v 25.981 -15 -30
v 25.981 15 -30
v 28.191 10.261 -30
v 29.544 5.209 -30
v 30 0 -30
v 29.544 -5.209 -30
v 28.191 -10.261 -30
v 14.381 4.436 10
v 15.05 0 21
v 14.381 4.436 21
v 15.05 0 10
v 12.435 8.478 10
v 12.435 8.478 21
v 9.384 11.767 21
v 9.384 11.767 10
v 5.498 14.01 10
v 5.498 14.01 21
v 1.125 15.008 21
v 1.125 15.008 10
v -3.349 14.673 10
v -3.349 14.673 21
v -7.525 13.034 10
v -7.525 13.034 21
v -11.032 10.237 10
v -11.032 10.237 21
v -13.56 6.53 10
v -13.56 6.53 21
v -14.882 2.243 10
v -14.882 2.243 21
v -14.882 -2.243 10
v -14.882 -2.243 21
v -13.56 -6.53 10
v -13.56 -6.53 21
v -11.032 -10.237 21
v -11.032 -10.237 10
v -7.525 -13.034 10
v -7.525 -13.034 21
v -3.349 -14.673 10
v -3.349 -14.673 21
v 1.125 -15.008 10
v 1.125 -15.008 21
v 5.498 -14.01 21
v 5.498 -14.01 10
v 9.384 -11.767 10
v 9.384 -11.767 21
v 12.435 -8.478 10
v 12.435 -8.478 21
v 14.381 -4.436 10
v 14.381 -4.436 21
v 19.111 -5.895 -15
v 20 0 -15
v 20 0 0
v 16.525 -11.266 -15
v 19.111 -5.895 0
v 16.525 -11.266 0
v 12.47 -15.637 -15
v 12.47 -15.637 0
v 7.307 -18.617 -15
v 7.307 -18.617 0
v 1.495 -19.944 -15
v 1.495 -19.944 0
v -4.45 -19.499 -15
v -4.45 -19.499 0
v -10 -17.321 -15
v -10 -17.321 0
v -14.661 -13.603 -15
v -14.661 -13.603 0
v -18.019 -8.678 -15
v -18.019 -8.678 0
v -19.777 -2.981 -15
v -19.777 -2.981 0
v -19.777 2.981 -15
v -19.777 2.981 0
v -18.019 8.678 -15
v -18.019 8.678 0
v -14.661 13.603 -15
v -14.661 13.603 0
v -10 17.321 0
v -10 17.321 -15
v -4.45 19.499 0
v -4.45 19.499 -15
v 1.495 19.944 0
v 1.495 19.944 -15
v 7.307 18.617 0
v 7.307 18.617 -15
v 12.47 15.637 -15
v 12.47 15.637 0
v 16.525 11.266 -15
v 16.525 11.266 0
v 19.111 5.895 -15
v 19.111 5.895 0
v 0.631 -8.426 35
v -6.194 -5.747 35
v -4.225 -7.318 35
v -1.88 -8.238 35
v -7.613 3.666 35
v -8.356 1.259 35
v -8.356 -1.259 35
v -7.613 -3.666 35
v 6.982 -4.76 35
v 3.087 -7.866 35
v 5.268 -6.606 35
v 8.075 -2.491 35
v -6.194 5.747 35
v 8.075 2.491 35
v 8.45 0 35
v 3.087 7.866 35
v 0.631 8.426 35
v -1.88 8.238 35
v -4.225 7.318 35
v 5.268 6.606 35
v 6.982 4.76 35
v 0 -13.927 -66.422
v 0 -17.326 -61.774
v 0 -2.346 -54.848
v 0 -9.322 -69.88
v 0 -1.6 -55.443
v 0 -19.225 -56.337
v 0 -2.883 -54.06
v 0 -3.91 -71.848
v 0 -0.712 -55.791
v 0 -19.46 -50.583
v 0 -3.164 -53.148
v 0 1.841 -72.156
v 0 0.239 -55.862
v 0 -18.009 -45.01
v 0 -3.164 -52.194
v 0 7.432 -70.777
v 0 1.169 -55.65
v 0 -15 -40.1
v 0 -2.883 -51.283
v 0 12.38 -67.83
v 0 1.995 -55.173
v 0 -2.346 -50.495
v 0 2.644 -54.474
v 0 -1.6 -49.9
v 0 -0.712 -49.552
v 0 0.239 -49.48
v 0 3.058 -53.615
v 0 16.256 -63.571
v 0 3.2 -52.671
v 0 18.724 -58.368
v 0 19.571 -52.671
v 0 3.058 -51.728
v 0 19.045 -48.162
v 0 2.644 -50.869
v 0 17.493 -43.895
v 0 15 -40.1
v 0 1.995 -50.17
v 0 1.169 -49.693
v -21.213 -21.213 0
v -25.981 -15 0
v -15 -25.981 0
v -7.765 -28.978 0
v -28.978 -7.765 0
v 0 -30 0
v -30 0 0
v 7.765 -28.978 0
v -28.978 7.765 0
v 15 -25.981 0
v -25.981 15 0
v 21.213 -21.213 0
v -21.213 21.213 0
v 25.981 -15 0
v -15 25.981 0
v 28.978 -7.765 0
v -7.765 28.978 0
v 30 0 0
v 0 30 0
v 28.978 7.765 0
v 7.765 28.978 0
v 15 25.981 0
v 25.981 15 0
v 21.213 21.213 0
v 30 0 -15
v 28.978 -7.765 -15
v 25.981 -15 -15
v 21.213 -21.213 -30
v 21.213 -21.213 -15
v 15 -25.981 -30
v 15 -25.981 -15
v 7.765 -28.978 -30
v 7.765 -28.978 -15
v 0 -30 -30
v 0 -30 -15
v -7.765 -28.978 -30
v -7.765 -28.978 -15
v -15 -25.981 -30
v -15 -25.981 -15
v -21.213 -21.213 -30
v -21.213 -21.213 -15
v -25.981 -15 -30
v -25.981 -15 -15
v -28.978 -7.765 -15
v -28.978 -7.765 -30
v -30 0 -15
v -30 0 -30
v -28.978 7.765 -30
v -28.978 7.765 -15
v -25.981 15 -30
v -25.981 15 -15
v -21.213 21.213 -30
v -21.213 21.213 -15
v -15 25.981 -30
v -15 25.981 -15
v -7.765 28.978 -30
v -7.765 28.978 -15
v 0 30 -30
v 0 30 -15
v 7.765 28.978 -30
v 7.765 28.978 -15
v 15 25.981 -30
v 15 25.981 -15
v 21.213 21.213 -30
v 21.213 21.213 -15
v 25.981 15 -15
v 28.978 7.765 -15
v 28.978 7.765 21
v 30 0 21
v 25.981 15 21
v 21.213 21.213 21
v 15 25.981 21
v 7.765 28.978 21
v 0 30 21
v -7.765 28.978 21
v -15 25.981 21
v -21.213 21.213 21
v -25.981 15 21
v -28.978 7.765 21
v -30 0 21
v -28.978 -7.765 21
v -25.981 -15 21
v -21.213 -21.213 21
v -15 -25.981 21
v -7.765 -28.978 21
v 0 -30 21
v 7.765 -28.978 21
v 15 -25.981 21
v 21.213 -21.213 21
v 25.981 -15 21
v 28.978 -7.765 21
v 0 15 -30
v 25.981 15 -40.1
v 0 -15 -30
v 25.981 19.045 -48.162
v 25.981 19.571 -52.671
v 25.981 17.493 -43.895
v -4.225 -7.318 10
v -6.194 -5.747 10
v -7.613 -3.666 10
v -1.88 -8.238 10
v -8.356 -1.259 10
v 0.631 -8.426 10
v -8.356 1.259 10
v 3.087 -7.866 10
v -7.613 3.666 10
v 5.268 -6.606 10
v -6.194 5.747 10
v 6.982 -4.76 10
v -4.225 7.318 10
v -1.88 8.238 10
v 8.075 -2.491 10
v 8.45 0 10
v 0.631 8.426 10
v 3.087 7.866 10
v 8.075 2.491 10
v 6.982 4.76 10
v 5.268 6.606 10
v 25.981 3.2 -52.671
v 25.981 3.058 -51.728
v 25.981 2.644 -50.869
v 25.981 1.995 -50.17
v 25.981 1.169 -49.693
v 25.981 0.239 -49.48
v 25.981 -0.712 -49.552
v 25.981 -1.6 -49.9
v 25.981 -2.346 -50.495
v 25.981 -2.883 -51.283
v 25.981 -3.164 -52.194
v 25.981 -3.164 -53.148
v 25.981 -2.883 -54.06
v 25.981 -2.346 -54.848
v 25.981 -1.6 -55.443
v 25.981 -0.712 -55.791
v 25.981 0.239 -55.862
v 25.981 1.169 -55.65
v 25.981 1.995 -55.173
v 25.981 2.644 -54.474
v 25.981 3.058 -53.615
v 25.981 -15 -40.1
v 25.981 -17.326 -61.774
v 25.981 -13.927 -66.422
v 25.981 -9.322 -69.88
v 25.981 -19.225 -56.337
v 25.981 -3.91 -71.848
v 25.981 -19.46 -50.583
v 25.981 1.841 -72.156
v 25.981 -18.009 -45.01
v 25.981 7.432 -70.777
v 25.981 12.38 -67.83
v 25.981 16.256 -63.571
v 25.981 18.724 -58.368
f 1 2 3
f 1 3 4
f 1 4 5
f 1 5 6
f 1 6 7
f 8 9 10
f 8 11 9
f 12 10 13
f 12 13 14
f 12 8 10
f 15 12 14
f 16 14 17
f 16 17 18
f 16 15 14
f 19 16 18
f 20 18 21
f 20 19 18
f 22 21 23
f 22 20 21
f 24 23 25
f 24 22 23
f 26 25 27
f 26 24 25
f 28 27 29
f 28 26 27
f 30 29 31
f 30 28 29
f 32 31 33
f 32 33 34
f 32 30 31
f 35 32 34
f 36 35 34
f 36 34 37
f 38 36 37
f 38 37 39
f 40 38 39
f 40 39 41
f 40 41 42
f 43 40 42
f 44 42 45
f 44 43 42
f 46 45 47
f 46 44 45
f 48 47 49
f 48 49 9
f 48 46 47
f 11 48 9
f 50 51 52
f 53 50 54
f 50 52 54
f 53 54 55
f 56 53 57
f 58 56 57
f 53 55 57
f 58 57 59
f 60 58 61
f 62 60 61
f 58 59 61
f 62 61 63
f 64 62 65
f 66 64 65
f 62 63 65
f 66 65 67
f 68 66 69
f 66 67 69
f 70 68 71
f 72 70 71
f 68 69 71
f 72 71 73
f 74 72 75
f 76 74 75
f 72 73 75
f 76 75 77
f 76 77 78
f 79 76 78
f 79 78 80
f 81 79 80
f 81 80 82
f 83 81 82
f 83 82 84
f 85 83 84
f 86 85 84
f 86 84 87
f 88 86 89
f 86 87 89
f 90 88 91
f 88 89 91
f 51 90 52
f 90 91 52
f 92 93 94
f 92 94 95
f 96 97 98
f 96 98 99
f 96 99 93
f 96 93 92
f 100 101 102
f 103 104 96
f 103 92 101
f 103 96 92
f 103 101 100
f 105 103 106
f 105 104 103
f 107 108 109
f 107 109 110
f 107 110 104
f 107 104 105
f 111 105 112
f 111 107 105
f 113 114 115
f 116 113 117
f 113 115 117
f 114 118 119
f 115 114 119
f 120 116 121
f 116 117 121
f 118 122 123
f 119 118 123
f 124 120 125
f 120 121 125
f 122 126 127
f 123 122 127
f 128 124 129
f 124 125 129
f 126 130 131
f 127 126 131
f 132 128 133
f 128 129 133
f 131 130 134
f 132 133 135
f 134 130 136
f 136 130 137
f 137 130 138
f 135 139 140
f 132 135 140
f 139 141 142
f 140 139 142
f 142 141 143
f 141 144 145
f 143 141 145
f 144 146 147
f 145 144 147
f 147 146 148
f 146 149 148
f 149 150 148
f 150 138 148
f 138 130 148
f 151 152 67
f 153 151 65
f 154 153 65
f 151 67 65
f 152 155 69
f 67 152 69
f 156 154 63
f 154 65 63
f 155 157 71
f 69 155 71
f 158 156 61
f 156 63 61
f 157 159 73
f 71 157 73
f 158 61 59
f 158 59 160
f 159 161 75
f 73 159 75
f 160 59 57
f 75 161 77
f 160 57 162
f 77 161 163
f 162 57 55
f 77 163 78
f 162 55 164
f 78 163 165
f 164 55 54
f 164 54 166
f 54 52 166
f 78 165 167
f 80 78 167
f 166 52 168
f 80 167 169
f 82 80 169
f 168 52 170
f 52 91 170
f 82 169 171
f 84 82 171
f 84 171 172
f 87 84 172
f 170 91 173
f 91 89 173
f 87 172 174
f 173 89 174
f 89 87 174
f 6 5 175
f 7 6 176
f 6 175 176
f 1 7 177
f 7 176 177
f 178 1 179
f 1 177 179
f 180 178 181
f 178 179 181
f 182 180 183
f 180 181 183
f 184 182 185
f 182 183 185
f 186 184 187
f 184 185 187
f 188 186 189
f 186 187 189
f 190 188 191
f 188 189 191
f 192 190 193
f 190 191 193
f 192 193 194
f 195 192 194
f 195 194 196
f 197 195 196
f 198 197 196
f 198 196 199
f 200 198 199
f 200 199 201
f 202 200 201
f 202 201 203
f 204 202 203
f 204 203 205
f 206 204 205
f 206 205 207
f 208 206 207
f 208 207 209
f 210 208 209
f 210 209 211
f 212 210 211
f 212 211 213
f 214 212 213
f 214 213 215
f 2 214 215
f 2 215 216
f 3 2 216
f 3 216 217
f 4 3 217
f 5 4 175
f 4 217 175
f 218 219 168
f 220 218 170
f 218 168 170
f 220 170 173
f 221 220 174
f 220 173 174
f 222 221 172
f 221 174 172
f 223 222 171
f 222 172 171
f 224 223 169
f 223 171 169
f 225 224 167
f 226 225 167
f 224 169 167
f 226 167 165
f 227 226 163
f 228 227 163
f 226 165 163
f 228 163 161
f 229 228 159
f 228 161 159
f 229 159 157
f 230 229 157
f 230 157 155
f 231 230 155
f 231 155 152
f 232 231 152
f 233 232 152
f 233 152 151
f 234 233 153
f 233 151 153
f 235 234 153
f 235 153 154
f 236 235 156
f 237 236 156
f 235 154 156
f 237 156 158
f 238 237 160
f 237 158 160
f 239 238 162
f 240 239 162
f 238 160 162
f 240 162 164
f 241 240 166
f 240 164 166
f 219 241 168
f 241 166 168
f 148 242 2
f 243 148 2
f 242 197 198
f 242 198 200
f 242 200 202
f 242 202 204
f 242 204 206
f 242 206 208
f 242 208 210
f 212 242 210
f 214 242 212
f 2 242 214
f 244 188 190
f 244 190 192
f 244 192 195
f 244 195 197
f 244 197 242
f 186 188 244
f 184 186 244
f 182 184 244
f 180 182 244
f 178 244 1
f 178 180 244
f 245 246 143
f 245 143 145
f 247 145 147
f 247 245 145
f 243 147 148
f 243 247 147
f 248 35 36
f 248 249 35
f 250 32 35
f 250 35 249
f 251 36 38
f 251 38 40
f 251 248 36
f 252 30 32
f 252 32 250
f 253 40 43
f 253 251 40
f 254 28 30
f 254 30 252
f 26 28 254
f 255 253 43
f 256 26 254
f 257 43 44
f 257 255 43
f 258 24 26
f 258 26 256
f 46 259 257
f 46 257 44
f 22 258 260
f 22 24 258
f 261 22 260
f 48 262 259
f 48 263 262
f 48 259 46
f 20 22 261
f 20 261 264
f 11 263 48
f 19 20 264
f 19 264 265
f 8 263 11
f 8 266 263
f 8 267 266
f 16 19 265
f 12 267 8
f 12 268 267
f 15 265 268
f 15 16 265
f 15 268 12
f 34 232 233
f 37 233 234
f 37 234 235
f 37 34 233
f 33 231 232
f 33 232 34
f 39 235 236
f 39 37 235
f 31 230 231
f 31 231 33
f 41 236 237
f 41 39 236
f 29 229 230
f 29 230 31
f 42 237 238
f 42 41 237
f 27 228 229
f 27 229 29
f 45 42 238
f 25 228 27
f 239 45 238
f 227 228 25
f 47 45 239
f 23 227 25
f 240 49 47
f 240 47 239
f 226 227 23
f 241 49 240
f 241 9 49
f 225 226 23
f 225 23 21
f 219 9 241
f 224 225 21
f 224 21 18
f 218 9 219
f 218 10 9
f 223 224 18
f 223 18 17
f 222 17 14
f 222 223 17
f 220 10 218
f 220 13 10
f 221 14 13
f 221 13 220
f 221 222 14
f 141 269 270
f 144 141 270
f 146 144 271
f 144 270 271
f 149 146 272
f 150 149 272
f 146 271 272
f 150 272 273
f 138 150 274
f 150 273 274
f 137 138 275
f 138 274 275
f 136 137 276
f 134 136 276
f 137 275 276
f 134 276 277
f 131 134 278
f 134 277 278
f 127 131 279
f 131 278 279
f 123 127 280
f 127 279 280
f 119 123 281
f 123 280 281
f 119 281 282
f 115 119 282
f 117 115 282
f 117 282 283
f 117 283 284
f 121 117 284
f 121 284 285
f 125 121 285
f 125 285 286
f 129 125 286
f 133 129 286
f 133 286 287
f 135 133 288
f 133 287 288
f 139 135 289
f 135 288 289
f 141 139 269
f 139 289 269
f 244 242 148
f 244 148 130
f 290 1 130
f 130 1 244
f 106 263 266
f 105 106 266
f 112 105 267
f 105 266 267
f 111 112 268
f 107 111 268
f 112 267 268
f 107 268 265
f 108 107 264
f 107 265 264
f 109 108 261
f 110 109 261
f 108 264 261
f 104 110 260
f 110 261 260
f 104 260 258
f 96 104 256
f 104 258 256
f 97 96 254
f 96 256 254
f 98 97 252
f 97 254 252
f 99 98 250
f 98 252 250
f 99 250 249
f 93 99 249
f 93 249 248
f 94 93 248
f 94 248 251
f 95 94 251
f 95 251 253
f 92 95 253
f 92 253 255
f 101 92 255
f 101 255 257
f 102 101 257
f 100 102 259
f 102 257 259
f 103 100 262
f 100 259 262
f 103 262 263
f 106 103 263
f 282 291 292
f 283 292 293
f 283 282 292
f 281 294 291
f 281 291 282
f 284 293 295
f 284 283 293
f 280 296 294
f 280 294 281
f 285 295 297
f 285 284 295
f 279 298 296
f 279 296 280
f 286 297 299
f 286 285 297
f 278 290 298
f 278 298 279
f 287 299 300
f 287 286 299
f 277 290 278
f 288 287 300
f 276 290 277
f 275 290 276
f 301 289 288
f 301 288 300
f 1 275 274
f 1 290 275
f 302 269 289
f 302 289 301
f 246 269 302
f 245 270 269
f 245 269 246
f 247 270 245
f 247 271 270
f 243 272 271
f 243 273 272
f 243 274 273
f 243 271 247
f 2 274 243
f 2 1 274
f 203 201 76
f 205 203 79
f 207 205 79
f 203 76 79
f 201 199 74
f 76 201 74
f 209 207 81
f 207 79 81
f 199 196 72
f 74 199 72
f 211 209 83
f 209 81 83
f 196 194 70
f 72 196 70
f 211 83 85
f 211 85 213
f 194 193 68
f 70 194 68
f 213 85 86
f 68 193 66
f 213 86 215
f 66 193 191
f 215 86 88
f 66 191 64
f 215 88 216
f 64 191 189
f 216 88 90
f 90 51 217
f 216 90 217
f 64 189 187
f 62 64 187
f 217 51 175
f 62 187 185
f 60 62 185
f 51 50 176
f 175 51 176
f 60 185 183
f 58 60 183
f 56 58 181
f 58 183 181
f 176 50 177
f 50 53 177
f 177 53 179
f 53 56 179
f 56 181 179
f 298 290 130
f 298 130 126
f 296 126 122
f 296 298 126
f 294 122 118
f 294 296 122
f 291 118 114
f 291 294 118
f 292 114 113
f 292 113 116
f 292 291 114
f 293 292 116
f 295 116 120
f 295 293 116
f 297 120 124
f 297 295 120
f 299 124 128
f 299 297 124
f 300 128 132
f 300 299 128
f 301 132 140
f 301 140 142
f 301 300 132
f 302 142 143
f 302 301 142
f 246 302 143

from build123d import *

# Parameters (mm, degrees)
F0_R      = 30
F1_DEPTH  = 15
F2_R      = 15.05
F3_DEPTH  = 5
F4_DEPTH  = 6
F5_R      = 20
F6_DEPTH  = 15
F7_R      = 30
F7_R_2    = 20
F8_DEPTH  = 15
F9_W      = 12.9903810568
F9_H      = 30
F10_DEPTH = 10.1
F11_R     = 3.2
F12_DEPTH = 25.98076
F13_R     = 8.45
F14_DEPTH = 25


with BuildPart() as f1:
    # F0 (on Top) → F1 (new body)
    with BuildSketch(Plane.XY):
        Circle(F0_R)
    extrude(amount=F1_DEPTH)

    # F2 (on face) → F3 (cut)
    with BuildSketch(Plane.XY.offset(15)):
        Circle(F2_R)
    extrude(amount=-F3_DEPTH, mode=Mode.SUBTRACT)

    # F4 (add): a face of the model
    f4_faces = [f1.faces().sort_by_distance(p)[0] for p in [
        (-29.1514718626, 0, 15),
    ]]
    extrude(f4_faces, amount=F4_DEPTH)

    # F5 (on face) → F6 (join)
    with BuildSketch(Plane(origin=(0, 0, 0), x_dir=(1, 0, 0), z_dir=(0, 0, -1))):
        Circle(F5_R)
    extrude(amount=F6_DEPTH)

    # F7 (on face) → F8 (join)
    with BuildSketch(Plane(origin=(0, 0, -15), x_dir=(1, 0, 0), z_dir=(0, 0, -1))):
        Circle(F7_R)
        Circle(F7_R_2, mode=Mode.SUBTRACT)
        Circle(F7_R_2)
    extrude(amount=F8_DEPTH)

    # F9 (on face) → F10 (join)
    with BuildSketch(Plane(origin=(0, 0, -30), x_dir=(1, 0, 0), z_dir=(0, 0, -1))):
        with Locations((6.4951905284, 0)):
            Rectangle(F9_W, F9_H)
        with Locations((19.4855715851, 0)):
            Rectangle(F9_W, F9_H)
    extrude(amount=F10_DEPTH)

    # F11 (on face) → F12 (join)
    with BuildSketch(Plane.YZ.offset(25.9807621135)):
        with BuildLine():
            Line((15, -40.1), (0, -40.1))
            Line((0, -40.1), (-15, -40.1))
            ThreePointArc((-15, -40.1), (-6.688399949, -71.0645284311), (19.5714285714, -52.6714285714))
            ThreePointArc((19.5714285714, -52.6714285714), (18.3930998597, -45.9830286224), (15, -40.1))
        make_face()
        with Locations((0, -52.6714285714)):
            Circle(F11_R, mode=Mode.SUBTRACT)
    extrude(amount=-F12_DEPTH)

    # F13 (on face) → F14 (join)
    with BuildSketch(Plane.XY.offset(10)):
        Circle(F13_R)
    extrude(amount=F14_DEPTH)


solid = f1.part
